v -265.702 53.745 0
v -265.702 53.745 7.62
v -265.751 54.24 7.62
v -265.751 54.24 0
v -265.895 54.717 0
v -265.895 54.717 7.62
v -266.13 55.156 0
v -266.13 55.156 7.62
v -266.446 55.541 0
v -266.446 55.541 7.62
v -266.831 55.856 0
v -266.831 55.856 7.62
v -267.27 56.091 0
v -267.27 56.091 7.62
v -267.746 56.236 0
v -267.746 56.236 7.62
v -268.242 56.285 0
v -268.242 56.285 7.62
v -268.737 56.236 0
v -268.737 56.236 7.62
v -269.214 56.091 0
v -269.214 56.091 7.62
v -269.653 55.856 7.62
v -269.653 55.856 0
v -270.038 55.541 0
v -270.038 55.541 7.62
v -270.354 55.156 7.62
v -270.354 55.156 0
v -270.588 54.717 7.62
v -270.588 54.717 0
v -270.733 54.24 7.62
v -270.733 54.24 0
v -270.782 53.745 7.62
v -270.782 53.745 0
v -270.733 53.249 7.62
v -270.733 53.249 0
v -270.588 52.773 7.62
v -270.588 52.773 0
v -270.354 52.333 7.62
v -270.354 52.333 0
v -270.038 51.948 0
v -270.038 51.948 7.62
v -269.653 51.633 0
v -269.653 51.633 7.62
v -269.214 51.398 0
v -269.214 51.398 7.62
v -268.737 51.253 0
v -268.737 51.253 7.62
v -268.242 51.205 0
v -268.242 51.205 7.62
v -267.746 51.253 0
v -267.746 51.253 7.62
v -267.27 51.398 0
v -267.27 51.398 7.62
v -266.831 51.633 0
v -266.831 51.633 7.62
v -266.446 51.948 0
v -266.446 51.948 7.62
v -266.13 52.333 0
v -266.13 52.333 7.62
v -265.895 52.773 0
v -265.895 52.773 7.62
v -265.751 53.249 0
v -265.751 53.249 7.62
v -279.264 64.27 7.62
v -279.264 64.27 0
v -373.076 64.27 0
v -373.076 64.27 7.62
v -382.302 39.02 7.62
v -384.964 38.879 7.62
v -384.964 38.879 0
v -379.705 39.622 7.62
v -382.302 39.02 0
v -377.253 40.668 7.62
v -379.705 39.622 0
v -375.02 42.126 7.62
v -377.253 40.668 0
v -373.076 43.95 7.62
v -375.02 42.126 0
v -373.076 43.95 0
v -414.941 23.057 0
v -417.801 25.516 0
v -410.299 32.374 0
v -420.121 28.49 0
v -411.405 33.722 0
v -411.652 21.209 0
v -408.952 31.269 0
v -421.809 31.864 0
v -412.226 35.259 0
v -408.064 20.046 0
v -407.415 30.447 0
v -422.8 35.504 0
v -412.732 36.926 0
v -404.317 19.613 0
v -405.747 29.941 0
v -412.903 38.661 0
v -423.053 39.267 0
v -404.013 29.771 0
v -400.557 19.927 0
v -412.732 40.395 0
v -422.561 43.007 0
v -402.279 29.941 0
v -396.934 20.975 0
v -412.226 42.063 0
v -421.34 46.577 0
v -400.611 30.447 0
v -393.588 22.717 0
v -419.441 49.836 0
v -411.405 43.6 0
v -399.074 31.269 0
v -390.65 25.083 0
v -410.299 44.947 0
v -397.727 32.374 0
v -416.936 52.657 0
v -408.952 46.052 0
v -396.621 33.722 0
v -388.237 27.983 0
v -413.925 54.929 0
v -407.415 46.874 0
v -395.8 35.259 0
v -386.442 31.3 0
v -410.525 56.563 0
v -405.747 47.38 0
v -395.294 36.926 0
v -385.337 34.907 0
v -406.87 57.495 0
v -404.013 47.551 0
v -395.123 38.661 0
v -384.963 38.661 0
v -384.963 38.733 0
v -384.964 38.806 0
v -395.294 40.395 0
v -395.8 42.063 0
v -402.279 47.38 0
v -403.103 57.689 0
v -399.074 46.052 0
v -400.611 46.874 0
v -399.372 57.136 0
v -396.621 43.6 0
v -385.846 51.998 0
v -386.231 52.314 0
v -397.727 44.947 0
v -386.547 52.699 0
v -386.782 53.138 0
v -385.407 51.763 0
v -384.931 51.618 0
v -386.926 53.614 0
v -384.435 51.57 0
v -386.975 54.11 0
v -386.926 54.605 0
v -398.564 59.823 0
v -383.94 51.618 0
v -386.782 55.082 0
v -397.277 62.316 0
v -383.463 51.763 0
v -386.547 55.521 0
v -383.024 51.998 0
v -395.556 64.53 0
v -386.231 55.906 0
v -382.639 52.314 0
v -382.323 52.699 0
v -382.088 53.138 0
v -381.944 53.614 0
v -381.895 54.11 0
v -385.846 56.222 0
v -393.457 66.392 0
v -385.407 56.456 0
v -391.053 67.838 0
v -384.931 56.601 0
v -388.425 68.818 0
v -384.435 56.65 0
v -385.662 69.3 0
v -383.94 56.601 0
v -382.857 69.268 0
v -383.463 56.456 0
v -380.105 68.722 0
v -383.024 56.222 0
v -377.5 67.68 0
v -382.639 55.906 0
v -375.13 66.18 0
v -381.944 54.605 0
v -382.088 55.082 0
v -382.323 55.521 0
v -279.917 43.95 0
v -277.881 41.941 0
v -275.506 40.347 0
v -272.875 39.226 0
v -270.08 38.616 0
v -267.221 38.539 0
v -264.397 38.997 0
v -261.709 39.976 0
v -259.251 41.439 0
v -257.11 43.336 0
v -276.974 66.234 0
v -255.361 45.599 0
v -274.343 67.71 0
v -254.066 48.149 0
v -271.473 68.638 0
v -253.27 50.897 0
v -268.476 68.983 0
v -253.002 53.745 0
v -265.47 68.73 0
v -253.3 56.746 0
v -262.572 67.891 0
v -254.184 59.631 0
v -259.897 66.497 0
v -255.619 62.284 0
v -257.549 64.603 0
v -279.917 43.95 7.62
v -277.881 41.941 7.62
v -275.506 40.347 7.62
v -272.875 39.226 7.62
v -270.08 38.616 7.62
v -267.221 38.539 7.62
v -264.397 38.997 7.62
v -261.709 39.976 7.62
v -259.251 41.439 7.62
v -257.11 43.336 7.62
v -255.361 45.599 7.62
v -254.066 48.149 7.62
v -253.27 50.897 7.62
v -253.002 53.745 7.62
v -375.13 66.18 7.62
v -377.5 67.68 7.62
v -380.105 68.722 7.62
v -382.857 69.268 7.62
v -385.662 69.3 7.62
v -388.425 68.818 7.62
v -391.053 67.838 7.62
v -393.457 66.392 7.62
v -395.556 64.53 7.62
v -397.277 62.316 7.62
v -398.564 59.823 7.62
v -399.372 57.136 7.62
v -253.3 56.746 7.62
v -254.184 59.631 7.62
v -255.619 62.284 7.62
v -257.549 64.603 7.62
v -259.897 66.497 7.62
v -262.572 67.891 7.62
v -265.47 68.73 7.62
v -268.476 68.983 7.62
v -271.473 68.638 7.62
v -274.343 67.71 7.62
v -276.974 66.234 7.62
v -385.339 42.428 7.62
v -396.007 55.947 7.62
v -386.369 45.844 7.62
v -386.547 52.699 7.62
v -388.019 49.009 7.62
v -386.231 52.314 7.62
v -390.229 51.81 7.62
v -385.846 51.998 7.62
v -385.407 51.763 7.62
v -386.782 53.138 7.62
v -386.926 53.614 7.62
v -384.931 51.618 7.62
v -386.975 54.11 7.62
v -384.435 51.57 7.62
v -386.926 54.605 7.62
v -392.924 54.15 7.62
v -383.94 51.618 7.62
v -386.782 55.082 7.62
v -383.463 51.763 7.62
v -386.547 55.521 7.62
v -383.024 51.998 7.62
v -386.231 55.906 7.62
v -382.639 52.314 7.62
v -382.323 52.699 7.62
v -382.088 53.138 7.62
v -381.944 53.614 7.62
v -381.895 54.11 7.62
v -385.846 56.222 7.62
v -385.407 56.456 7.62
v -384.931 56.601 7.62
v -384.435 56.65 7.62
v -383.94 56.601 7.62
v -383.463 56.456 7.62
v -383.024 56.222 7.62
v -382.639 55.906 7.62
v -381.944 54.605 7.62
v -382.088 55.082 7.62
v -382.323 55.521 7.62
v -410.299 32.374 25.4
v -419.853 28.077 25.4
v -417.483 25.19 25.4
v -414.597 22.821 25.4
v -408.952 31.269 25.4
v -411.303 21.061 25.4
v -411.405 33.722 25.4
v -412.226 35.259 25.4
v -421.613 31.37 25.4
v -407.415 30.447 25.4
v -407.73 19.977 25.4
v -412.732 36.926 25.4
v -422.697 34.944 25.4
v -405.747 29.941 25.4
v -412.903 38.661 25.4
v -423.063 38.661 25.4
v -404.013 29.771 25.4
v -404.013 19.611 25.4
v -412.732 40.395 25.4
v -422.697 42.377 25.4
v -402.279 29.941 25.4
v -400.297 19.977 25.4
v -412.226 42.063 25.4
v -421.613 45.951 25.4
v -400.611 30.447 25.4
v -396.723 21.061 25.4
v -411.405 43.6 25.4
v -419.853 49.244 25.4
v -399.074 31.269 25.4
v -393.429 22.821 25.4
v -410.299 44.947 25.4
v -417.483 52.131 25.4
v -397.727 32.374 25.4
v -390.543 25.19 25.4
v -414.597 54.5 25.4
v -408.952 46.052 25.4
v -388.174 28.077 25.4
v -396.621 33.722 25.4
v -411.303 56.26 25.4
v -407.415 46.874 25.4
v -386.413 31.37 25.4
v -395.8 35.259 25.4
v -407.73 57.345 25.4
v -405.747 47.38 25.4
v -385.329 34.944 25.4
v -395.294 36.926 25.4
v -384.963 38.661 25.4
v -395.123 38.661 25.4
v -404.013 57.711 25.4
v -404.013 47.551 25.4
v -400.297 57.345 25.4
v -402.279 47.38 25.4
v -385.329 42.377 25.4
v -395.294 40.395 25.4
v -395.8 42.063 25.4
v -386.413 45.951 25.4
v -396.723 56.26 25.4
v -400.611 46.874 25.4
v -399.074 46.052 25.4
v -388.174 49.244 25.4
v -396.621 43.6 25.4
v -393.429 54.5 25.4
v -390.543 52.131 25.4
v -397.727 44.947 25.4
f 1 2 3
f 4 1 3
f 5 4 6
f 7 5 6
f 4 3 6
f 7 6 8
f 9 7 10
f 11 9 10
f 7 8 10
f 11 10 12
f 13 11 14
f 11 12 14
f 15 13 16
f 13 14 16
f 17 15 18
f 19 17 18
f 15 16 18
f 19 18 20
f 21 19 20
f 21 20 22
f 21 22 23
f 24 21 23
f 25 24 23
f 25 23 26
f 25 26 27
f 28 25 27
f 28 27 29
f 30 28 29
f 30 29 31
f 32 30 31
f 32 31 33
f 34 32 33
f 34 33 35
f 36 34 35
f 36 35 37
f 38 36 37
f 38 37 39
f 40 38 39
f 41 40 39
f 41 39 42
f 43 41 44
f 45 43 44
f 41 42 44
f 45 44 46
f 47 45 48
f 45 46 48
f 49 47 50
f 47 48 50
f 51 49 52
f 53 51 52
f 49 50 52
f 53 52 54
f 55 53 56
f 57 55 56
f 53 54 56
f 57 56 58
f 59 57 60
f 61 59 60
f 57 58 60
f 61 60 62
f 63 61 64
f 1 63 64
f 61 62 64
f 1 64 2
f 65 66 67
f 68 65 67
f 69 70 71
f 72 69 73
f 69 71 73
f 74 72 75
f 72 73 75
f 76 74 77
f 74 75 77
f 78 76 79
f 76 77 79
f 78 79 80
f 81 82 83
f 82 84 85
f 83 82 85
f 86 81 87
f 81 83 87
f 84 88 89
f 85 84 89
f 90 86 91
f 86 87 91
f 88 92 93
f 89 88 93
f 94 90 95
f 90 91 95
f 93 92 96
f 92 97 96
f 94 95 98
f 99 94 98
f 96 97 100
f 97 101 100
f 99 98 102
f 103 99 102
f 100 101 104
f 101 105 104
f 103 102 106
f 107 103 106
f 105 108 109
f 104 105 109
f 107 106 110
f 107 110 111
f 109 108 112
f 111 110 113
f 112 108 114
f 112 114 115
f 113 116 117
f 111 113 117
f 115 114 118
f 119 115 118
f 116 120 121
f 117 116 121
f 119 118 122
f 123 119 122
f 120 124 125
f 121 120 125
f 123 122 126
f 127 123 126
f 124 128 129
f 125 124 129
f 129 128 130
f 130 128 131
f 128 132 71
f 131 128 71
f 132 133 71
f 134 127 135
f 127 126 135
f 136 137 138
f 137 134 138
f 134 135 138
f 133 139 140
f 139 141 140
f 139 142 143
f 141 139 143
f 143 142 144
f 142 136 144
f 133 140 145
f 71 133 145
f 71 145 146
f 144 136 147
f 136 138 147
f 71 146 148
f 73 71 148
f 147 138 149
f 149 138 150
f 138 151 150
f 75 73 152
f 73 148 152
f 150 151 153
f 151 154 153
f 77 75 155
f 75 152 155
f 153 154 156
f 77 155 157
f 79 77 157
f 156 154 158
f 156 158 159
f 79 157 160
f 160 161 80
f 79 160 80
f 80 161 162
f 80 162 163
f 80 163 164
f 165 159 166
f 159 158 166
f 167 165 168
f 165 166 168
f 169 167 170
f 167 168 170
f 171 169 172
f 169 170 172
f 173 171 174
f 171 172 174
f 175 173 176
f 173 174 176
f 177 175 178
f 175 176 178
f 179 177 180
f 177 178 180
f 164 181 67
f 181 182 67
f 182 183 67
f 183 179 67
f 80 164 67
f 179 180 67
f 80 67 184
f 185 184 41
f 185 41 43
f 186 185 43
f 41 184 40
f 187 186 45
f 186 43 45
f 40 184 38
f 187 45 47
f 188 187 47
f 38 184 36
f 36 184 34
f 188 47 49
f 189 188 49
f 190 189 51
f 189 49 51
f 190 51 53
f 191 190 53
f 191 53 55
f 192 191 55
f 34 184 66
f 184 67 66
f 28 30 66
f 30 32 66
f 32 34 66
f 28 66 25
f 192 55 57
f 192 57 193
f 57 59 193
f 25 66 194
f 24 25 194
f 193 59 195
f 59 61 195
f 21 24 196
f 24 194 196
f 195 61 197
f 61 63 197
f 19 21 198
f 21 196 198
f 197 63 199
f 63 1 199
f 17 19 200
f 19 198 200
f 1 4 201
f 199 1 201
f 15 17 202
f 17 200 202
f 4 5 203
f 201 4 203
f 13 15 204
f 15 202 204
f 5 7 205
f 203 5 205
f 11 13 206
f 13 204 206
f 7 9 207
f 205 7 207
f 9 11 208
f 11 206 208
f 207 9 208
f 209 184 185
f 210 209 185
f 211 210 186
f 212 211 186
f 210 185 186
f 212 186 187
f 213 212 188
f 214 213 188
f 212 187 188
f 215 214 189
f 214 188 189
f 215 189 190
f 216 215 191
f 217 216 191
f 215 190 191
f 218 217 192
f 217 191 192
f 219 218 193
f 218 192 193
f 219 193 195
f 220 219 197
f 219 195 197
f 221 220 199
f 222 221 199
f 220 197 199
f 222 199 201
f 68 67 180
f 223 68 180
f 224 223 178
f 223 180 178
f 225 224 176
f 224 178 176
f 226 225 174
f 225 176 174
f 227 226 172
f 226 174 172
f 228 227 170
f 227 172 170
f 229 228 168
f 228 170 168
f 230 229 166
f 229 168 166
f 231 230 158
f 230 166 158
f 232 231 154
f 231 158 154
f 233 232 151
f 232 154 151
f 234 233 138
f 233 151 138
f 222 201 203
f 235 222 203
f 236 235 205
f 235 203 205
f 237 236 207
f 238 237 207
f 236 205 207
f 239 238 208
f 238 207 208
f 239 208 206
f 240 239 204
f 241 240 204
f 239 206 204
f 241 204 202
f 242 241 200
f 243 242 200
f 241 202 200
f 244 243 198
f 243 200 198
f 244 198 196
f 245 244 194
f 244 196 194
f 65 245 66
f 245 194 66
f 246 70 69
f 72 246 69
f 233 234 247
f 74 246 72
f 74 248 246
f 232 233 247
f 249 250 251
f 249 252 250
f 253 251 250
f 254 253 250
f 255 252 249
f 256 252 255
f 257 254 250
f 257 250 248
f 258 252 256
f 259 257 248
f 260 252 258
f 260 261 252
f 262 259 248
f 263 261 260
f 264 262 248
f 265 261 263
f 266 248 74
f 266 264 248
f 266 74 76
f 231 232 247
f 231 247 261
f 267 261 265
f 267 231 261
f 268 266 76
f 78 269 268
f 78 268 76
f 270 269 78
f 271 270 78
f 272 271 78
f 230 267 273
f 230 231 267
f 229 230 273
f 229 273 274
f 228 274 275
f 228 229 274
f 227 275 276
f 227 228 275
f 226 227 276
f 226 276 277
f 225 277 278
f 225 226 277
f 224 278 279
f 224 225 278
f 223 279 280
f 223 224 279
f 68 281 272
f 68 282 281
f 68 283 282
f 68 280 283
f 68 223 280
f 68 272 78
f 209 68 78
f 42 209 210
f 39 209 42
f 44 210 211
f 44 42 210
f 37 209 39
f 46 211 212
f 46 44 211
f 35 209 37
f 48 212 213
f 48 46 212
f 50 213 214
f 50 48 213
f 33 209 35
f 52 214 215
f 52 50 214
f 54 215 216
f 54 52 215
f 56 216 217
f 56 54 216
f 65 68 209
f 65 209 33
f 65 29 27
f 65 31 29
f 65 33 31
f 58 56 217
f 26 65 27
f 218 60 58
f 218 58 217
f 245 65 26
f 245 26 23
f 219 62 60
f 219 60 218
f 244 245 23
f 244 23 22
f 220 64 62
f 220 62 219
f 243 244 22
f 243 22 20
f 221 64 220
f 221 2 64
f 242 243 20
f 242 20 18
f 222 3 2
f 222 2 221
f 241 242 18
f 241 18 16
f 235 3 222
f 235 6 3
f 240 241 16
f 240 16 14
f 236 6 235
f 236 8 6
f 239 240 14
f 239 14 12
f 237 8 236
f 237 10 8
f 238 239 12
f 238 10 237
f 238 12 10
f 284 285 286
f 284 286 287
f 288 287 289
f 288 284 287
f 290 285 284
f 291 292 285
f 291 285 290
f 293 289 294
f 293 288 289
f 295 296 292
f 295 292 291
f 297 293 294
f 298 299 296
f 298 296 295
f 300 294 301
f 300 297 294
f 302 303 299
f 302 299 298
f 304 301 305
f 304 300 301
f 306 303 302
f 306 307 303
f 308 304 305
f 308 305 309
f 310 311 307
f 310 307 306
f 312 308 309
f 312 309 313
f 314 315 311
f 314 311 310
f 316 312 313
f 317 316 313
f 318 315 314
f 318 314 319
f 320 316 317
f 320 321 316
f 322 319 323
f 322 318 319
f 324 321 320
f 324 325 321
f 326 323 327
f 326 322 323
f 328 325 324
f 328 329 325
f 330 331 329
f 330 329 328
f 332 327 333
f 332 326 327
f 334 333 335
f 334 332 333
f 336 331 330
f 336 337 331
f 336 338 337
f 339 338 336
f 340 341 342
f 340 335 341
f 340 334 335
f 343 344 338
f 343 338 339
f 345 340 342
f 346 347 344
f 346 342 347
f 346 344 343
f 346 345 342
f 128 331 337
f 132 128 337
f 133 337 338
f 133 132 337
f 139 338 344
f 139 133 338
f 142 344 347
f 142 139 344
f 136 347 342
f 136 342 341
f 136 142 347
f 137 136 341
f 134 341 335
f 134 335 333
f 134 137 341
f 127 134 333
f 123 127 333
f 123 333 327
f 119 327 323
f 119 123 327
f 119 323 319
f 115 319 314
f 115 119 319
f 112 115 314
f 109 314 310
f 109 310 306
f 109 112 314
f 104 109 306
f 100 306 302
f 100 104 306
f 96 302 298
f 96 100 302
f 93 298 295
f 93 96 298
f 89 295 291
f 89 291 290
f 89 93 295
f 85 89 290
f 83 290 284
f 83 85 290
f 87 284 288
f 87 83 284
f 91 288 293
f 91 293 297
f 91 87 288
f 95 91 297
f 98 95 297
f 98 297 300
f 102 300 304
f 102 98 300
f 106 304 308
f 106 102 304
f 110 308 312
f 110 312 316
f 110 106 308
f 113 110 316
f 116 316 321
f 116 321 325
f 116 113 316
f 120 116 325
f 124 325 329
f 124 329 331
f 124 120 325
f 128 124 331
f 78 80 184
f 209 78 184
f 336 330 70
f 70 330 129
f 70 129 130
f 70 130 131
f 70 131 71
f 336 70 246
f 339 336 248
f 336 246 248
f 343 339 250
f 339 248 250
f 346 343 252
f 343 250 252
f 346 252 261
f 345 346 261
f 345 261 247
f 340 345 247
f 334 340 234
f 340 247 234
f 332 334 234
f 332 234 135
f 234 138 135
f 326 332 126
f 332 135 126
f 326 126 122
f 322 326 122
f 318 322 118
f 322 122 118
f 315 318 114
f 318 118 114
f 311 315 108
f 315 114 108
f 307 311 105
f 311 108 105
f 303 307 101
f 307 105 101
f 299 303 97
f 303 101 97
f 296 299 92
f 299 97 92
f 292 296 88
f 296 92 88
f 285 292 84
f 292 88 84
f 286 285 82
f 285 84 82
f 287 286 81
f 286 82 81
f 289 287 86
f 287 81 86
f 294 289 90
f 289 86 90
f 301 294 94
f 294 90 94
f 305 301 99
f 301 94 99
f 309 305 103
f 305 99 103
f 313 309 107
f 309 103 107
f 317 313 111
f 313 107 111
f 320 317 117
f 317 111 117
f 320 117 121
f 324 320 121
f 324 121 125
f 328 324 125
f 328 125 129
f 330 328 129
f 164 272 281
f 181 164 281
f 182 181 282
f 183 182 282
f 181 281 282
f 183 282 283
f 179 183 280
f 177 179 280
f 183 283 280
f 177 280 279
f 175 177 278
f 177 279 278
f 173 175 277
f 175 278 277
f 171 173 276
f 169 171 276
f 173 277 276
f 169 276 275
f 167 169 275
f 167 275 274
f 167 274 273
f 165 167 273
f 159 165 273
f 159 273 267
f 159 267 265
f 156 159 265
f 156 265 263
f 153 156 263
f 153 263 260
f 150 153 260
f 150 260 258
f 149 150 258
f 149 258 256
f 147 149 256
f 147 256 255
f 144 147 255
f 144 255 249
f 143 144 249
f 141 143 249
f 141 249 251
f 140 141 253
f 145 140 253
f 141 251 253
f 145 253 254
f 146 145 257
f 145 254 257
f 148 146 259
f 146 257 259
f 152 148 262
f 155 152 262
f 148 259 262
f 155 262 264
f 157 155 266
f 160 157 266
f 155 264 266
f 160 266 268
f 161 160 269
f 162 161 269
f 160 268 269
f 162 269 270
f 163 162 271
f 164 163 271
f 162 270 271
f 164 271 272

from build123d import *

# Parameters (mm, degrees)
F1_DEPTH = 7.62
F2_R     = 2.54
F3_DEPTH = 25.4
F4_R     = 19.05
F4_R_2   = 8.89
F5_DEPTH = 25.4


with BuildPart() as f1:
    # F0 (on Top) → F1 (new body)
    with BuildSketch(Plane.XY):
        with BuildLine():
            ThreePointArc((-279.9174020173, 43.9496934414), (-263.0302165533, 39.4233371805), (-253.0018394569, 53.7445308008))
            ThreePointArc((-253.0018394569, 53.7445308008), (-262.5723411754, 67.8907101167), (-279.2635703278, 64.2696934414))
            Line((-279.2635703278, 64.2696934414), (-279.2635703278, 43.9496934414))
            Line((-279.2635703278, 43.9496934414), (-279.9174020173, 43.9496934414))
        make_face()
        with BuildLine():
            Line((-279.2635703278, 43.9496934414), (-279.2635703278, 64.2696934414))
            ThreePointArc((-279.2635703278, 64.2696934414), (-283.4739562591, 54.2346509123), (-279.9174020173, 43.9496934414))
            Line((-279.9174020173, 43.9496934414), (-279.2635703278, 43.9496934414))
        make_face()
        with BuildLine():
            ThreePointArc((-279.9174020173, 43.9496934414), (-283.4739562591, 54.2346509123), (-279.2635703278, 64.2696934414))
            Line((-279.2635703278, 64.2696934414), (-373.075891919, 64.2696934414))
            ThreePointArc((-373.075891919, 64.2696934414), (-370.1983304941, 59.5476620895), (-369.1951172447, 54.1096934414))
            ThreePointArc((-369.1951172447, 54.1096934414), (-370.1983304941, 48.6717247932), (-373.075891919, 43.9496934414))
            Line((-373.075891919, 43.9496934414), (-279.9174020173, 43.9496934414))
        make_face()
        with BuildLine():
            ThreePointArc((-369.1951172447, 54.1096934414), (-370.1983304941, 59.5476620895), (-373.075891919, 64.2696934414))
            Line((-373.075891919, 64.2696934414), (-373.2435703278, 64.2696934414))
            Line((-373.2435703278, 64.2696934414), (-373.2435703278, 43.9496934414))
            Line((-373.2435703278, 43.9496934414), (-373.075891919, 43.9496934414))
            ThreePointArc((-373.075891919, 43.9496934414), (-370.1983304941, 48.6717247932), (-369.1951172447, 54.1096934414))
        make_face()
        with BuildLine():
            Line((-373.2435703278, 64.2696934414), (-373.075891919, 64.2696934414))
            ThreePointArc((-373.075891919, 64.2696934414), (-399.6751172447, 54.1096934414), (-373.075891919, 43.9496934414))
            Line((-373.075891919, 43.9496934414), (-373.2435703278, 43.9496934414))
            Line((-373.2435703278, 43.9496934414), (-373.2435703278, 64.2696934414))
        make_face()
    extrude(amount=F1_DEPTH)

    # F2 (on face) → F3 (cut)
    with BuildSketch(Plane.XY.offset(7.62)):
        with Locations((-384.4351172447, 54.1096934414)):
            Circle(F2_R)
        with Locations((-268.2418394569, 53.7445308008)):
            Circle(F2_R)
    extrude(amount=-F3_DEPTH, mode=Mode.SUBTRACT)

    # F4 (on Top) → F5 (join)
    with BuildSketch(Plane.XY):
        with Locations((-404.0130972862, 38.6605933309)):
            Circle(F4_R)
        with Locations((-404.0130972862, 38.6605933309)):
            Circle(F4_R_2, mode=Mode.SUBTRACT)
    extrude(amount=F5_DEPTH)


solid = f1.part
